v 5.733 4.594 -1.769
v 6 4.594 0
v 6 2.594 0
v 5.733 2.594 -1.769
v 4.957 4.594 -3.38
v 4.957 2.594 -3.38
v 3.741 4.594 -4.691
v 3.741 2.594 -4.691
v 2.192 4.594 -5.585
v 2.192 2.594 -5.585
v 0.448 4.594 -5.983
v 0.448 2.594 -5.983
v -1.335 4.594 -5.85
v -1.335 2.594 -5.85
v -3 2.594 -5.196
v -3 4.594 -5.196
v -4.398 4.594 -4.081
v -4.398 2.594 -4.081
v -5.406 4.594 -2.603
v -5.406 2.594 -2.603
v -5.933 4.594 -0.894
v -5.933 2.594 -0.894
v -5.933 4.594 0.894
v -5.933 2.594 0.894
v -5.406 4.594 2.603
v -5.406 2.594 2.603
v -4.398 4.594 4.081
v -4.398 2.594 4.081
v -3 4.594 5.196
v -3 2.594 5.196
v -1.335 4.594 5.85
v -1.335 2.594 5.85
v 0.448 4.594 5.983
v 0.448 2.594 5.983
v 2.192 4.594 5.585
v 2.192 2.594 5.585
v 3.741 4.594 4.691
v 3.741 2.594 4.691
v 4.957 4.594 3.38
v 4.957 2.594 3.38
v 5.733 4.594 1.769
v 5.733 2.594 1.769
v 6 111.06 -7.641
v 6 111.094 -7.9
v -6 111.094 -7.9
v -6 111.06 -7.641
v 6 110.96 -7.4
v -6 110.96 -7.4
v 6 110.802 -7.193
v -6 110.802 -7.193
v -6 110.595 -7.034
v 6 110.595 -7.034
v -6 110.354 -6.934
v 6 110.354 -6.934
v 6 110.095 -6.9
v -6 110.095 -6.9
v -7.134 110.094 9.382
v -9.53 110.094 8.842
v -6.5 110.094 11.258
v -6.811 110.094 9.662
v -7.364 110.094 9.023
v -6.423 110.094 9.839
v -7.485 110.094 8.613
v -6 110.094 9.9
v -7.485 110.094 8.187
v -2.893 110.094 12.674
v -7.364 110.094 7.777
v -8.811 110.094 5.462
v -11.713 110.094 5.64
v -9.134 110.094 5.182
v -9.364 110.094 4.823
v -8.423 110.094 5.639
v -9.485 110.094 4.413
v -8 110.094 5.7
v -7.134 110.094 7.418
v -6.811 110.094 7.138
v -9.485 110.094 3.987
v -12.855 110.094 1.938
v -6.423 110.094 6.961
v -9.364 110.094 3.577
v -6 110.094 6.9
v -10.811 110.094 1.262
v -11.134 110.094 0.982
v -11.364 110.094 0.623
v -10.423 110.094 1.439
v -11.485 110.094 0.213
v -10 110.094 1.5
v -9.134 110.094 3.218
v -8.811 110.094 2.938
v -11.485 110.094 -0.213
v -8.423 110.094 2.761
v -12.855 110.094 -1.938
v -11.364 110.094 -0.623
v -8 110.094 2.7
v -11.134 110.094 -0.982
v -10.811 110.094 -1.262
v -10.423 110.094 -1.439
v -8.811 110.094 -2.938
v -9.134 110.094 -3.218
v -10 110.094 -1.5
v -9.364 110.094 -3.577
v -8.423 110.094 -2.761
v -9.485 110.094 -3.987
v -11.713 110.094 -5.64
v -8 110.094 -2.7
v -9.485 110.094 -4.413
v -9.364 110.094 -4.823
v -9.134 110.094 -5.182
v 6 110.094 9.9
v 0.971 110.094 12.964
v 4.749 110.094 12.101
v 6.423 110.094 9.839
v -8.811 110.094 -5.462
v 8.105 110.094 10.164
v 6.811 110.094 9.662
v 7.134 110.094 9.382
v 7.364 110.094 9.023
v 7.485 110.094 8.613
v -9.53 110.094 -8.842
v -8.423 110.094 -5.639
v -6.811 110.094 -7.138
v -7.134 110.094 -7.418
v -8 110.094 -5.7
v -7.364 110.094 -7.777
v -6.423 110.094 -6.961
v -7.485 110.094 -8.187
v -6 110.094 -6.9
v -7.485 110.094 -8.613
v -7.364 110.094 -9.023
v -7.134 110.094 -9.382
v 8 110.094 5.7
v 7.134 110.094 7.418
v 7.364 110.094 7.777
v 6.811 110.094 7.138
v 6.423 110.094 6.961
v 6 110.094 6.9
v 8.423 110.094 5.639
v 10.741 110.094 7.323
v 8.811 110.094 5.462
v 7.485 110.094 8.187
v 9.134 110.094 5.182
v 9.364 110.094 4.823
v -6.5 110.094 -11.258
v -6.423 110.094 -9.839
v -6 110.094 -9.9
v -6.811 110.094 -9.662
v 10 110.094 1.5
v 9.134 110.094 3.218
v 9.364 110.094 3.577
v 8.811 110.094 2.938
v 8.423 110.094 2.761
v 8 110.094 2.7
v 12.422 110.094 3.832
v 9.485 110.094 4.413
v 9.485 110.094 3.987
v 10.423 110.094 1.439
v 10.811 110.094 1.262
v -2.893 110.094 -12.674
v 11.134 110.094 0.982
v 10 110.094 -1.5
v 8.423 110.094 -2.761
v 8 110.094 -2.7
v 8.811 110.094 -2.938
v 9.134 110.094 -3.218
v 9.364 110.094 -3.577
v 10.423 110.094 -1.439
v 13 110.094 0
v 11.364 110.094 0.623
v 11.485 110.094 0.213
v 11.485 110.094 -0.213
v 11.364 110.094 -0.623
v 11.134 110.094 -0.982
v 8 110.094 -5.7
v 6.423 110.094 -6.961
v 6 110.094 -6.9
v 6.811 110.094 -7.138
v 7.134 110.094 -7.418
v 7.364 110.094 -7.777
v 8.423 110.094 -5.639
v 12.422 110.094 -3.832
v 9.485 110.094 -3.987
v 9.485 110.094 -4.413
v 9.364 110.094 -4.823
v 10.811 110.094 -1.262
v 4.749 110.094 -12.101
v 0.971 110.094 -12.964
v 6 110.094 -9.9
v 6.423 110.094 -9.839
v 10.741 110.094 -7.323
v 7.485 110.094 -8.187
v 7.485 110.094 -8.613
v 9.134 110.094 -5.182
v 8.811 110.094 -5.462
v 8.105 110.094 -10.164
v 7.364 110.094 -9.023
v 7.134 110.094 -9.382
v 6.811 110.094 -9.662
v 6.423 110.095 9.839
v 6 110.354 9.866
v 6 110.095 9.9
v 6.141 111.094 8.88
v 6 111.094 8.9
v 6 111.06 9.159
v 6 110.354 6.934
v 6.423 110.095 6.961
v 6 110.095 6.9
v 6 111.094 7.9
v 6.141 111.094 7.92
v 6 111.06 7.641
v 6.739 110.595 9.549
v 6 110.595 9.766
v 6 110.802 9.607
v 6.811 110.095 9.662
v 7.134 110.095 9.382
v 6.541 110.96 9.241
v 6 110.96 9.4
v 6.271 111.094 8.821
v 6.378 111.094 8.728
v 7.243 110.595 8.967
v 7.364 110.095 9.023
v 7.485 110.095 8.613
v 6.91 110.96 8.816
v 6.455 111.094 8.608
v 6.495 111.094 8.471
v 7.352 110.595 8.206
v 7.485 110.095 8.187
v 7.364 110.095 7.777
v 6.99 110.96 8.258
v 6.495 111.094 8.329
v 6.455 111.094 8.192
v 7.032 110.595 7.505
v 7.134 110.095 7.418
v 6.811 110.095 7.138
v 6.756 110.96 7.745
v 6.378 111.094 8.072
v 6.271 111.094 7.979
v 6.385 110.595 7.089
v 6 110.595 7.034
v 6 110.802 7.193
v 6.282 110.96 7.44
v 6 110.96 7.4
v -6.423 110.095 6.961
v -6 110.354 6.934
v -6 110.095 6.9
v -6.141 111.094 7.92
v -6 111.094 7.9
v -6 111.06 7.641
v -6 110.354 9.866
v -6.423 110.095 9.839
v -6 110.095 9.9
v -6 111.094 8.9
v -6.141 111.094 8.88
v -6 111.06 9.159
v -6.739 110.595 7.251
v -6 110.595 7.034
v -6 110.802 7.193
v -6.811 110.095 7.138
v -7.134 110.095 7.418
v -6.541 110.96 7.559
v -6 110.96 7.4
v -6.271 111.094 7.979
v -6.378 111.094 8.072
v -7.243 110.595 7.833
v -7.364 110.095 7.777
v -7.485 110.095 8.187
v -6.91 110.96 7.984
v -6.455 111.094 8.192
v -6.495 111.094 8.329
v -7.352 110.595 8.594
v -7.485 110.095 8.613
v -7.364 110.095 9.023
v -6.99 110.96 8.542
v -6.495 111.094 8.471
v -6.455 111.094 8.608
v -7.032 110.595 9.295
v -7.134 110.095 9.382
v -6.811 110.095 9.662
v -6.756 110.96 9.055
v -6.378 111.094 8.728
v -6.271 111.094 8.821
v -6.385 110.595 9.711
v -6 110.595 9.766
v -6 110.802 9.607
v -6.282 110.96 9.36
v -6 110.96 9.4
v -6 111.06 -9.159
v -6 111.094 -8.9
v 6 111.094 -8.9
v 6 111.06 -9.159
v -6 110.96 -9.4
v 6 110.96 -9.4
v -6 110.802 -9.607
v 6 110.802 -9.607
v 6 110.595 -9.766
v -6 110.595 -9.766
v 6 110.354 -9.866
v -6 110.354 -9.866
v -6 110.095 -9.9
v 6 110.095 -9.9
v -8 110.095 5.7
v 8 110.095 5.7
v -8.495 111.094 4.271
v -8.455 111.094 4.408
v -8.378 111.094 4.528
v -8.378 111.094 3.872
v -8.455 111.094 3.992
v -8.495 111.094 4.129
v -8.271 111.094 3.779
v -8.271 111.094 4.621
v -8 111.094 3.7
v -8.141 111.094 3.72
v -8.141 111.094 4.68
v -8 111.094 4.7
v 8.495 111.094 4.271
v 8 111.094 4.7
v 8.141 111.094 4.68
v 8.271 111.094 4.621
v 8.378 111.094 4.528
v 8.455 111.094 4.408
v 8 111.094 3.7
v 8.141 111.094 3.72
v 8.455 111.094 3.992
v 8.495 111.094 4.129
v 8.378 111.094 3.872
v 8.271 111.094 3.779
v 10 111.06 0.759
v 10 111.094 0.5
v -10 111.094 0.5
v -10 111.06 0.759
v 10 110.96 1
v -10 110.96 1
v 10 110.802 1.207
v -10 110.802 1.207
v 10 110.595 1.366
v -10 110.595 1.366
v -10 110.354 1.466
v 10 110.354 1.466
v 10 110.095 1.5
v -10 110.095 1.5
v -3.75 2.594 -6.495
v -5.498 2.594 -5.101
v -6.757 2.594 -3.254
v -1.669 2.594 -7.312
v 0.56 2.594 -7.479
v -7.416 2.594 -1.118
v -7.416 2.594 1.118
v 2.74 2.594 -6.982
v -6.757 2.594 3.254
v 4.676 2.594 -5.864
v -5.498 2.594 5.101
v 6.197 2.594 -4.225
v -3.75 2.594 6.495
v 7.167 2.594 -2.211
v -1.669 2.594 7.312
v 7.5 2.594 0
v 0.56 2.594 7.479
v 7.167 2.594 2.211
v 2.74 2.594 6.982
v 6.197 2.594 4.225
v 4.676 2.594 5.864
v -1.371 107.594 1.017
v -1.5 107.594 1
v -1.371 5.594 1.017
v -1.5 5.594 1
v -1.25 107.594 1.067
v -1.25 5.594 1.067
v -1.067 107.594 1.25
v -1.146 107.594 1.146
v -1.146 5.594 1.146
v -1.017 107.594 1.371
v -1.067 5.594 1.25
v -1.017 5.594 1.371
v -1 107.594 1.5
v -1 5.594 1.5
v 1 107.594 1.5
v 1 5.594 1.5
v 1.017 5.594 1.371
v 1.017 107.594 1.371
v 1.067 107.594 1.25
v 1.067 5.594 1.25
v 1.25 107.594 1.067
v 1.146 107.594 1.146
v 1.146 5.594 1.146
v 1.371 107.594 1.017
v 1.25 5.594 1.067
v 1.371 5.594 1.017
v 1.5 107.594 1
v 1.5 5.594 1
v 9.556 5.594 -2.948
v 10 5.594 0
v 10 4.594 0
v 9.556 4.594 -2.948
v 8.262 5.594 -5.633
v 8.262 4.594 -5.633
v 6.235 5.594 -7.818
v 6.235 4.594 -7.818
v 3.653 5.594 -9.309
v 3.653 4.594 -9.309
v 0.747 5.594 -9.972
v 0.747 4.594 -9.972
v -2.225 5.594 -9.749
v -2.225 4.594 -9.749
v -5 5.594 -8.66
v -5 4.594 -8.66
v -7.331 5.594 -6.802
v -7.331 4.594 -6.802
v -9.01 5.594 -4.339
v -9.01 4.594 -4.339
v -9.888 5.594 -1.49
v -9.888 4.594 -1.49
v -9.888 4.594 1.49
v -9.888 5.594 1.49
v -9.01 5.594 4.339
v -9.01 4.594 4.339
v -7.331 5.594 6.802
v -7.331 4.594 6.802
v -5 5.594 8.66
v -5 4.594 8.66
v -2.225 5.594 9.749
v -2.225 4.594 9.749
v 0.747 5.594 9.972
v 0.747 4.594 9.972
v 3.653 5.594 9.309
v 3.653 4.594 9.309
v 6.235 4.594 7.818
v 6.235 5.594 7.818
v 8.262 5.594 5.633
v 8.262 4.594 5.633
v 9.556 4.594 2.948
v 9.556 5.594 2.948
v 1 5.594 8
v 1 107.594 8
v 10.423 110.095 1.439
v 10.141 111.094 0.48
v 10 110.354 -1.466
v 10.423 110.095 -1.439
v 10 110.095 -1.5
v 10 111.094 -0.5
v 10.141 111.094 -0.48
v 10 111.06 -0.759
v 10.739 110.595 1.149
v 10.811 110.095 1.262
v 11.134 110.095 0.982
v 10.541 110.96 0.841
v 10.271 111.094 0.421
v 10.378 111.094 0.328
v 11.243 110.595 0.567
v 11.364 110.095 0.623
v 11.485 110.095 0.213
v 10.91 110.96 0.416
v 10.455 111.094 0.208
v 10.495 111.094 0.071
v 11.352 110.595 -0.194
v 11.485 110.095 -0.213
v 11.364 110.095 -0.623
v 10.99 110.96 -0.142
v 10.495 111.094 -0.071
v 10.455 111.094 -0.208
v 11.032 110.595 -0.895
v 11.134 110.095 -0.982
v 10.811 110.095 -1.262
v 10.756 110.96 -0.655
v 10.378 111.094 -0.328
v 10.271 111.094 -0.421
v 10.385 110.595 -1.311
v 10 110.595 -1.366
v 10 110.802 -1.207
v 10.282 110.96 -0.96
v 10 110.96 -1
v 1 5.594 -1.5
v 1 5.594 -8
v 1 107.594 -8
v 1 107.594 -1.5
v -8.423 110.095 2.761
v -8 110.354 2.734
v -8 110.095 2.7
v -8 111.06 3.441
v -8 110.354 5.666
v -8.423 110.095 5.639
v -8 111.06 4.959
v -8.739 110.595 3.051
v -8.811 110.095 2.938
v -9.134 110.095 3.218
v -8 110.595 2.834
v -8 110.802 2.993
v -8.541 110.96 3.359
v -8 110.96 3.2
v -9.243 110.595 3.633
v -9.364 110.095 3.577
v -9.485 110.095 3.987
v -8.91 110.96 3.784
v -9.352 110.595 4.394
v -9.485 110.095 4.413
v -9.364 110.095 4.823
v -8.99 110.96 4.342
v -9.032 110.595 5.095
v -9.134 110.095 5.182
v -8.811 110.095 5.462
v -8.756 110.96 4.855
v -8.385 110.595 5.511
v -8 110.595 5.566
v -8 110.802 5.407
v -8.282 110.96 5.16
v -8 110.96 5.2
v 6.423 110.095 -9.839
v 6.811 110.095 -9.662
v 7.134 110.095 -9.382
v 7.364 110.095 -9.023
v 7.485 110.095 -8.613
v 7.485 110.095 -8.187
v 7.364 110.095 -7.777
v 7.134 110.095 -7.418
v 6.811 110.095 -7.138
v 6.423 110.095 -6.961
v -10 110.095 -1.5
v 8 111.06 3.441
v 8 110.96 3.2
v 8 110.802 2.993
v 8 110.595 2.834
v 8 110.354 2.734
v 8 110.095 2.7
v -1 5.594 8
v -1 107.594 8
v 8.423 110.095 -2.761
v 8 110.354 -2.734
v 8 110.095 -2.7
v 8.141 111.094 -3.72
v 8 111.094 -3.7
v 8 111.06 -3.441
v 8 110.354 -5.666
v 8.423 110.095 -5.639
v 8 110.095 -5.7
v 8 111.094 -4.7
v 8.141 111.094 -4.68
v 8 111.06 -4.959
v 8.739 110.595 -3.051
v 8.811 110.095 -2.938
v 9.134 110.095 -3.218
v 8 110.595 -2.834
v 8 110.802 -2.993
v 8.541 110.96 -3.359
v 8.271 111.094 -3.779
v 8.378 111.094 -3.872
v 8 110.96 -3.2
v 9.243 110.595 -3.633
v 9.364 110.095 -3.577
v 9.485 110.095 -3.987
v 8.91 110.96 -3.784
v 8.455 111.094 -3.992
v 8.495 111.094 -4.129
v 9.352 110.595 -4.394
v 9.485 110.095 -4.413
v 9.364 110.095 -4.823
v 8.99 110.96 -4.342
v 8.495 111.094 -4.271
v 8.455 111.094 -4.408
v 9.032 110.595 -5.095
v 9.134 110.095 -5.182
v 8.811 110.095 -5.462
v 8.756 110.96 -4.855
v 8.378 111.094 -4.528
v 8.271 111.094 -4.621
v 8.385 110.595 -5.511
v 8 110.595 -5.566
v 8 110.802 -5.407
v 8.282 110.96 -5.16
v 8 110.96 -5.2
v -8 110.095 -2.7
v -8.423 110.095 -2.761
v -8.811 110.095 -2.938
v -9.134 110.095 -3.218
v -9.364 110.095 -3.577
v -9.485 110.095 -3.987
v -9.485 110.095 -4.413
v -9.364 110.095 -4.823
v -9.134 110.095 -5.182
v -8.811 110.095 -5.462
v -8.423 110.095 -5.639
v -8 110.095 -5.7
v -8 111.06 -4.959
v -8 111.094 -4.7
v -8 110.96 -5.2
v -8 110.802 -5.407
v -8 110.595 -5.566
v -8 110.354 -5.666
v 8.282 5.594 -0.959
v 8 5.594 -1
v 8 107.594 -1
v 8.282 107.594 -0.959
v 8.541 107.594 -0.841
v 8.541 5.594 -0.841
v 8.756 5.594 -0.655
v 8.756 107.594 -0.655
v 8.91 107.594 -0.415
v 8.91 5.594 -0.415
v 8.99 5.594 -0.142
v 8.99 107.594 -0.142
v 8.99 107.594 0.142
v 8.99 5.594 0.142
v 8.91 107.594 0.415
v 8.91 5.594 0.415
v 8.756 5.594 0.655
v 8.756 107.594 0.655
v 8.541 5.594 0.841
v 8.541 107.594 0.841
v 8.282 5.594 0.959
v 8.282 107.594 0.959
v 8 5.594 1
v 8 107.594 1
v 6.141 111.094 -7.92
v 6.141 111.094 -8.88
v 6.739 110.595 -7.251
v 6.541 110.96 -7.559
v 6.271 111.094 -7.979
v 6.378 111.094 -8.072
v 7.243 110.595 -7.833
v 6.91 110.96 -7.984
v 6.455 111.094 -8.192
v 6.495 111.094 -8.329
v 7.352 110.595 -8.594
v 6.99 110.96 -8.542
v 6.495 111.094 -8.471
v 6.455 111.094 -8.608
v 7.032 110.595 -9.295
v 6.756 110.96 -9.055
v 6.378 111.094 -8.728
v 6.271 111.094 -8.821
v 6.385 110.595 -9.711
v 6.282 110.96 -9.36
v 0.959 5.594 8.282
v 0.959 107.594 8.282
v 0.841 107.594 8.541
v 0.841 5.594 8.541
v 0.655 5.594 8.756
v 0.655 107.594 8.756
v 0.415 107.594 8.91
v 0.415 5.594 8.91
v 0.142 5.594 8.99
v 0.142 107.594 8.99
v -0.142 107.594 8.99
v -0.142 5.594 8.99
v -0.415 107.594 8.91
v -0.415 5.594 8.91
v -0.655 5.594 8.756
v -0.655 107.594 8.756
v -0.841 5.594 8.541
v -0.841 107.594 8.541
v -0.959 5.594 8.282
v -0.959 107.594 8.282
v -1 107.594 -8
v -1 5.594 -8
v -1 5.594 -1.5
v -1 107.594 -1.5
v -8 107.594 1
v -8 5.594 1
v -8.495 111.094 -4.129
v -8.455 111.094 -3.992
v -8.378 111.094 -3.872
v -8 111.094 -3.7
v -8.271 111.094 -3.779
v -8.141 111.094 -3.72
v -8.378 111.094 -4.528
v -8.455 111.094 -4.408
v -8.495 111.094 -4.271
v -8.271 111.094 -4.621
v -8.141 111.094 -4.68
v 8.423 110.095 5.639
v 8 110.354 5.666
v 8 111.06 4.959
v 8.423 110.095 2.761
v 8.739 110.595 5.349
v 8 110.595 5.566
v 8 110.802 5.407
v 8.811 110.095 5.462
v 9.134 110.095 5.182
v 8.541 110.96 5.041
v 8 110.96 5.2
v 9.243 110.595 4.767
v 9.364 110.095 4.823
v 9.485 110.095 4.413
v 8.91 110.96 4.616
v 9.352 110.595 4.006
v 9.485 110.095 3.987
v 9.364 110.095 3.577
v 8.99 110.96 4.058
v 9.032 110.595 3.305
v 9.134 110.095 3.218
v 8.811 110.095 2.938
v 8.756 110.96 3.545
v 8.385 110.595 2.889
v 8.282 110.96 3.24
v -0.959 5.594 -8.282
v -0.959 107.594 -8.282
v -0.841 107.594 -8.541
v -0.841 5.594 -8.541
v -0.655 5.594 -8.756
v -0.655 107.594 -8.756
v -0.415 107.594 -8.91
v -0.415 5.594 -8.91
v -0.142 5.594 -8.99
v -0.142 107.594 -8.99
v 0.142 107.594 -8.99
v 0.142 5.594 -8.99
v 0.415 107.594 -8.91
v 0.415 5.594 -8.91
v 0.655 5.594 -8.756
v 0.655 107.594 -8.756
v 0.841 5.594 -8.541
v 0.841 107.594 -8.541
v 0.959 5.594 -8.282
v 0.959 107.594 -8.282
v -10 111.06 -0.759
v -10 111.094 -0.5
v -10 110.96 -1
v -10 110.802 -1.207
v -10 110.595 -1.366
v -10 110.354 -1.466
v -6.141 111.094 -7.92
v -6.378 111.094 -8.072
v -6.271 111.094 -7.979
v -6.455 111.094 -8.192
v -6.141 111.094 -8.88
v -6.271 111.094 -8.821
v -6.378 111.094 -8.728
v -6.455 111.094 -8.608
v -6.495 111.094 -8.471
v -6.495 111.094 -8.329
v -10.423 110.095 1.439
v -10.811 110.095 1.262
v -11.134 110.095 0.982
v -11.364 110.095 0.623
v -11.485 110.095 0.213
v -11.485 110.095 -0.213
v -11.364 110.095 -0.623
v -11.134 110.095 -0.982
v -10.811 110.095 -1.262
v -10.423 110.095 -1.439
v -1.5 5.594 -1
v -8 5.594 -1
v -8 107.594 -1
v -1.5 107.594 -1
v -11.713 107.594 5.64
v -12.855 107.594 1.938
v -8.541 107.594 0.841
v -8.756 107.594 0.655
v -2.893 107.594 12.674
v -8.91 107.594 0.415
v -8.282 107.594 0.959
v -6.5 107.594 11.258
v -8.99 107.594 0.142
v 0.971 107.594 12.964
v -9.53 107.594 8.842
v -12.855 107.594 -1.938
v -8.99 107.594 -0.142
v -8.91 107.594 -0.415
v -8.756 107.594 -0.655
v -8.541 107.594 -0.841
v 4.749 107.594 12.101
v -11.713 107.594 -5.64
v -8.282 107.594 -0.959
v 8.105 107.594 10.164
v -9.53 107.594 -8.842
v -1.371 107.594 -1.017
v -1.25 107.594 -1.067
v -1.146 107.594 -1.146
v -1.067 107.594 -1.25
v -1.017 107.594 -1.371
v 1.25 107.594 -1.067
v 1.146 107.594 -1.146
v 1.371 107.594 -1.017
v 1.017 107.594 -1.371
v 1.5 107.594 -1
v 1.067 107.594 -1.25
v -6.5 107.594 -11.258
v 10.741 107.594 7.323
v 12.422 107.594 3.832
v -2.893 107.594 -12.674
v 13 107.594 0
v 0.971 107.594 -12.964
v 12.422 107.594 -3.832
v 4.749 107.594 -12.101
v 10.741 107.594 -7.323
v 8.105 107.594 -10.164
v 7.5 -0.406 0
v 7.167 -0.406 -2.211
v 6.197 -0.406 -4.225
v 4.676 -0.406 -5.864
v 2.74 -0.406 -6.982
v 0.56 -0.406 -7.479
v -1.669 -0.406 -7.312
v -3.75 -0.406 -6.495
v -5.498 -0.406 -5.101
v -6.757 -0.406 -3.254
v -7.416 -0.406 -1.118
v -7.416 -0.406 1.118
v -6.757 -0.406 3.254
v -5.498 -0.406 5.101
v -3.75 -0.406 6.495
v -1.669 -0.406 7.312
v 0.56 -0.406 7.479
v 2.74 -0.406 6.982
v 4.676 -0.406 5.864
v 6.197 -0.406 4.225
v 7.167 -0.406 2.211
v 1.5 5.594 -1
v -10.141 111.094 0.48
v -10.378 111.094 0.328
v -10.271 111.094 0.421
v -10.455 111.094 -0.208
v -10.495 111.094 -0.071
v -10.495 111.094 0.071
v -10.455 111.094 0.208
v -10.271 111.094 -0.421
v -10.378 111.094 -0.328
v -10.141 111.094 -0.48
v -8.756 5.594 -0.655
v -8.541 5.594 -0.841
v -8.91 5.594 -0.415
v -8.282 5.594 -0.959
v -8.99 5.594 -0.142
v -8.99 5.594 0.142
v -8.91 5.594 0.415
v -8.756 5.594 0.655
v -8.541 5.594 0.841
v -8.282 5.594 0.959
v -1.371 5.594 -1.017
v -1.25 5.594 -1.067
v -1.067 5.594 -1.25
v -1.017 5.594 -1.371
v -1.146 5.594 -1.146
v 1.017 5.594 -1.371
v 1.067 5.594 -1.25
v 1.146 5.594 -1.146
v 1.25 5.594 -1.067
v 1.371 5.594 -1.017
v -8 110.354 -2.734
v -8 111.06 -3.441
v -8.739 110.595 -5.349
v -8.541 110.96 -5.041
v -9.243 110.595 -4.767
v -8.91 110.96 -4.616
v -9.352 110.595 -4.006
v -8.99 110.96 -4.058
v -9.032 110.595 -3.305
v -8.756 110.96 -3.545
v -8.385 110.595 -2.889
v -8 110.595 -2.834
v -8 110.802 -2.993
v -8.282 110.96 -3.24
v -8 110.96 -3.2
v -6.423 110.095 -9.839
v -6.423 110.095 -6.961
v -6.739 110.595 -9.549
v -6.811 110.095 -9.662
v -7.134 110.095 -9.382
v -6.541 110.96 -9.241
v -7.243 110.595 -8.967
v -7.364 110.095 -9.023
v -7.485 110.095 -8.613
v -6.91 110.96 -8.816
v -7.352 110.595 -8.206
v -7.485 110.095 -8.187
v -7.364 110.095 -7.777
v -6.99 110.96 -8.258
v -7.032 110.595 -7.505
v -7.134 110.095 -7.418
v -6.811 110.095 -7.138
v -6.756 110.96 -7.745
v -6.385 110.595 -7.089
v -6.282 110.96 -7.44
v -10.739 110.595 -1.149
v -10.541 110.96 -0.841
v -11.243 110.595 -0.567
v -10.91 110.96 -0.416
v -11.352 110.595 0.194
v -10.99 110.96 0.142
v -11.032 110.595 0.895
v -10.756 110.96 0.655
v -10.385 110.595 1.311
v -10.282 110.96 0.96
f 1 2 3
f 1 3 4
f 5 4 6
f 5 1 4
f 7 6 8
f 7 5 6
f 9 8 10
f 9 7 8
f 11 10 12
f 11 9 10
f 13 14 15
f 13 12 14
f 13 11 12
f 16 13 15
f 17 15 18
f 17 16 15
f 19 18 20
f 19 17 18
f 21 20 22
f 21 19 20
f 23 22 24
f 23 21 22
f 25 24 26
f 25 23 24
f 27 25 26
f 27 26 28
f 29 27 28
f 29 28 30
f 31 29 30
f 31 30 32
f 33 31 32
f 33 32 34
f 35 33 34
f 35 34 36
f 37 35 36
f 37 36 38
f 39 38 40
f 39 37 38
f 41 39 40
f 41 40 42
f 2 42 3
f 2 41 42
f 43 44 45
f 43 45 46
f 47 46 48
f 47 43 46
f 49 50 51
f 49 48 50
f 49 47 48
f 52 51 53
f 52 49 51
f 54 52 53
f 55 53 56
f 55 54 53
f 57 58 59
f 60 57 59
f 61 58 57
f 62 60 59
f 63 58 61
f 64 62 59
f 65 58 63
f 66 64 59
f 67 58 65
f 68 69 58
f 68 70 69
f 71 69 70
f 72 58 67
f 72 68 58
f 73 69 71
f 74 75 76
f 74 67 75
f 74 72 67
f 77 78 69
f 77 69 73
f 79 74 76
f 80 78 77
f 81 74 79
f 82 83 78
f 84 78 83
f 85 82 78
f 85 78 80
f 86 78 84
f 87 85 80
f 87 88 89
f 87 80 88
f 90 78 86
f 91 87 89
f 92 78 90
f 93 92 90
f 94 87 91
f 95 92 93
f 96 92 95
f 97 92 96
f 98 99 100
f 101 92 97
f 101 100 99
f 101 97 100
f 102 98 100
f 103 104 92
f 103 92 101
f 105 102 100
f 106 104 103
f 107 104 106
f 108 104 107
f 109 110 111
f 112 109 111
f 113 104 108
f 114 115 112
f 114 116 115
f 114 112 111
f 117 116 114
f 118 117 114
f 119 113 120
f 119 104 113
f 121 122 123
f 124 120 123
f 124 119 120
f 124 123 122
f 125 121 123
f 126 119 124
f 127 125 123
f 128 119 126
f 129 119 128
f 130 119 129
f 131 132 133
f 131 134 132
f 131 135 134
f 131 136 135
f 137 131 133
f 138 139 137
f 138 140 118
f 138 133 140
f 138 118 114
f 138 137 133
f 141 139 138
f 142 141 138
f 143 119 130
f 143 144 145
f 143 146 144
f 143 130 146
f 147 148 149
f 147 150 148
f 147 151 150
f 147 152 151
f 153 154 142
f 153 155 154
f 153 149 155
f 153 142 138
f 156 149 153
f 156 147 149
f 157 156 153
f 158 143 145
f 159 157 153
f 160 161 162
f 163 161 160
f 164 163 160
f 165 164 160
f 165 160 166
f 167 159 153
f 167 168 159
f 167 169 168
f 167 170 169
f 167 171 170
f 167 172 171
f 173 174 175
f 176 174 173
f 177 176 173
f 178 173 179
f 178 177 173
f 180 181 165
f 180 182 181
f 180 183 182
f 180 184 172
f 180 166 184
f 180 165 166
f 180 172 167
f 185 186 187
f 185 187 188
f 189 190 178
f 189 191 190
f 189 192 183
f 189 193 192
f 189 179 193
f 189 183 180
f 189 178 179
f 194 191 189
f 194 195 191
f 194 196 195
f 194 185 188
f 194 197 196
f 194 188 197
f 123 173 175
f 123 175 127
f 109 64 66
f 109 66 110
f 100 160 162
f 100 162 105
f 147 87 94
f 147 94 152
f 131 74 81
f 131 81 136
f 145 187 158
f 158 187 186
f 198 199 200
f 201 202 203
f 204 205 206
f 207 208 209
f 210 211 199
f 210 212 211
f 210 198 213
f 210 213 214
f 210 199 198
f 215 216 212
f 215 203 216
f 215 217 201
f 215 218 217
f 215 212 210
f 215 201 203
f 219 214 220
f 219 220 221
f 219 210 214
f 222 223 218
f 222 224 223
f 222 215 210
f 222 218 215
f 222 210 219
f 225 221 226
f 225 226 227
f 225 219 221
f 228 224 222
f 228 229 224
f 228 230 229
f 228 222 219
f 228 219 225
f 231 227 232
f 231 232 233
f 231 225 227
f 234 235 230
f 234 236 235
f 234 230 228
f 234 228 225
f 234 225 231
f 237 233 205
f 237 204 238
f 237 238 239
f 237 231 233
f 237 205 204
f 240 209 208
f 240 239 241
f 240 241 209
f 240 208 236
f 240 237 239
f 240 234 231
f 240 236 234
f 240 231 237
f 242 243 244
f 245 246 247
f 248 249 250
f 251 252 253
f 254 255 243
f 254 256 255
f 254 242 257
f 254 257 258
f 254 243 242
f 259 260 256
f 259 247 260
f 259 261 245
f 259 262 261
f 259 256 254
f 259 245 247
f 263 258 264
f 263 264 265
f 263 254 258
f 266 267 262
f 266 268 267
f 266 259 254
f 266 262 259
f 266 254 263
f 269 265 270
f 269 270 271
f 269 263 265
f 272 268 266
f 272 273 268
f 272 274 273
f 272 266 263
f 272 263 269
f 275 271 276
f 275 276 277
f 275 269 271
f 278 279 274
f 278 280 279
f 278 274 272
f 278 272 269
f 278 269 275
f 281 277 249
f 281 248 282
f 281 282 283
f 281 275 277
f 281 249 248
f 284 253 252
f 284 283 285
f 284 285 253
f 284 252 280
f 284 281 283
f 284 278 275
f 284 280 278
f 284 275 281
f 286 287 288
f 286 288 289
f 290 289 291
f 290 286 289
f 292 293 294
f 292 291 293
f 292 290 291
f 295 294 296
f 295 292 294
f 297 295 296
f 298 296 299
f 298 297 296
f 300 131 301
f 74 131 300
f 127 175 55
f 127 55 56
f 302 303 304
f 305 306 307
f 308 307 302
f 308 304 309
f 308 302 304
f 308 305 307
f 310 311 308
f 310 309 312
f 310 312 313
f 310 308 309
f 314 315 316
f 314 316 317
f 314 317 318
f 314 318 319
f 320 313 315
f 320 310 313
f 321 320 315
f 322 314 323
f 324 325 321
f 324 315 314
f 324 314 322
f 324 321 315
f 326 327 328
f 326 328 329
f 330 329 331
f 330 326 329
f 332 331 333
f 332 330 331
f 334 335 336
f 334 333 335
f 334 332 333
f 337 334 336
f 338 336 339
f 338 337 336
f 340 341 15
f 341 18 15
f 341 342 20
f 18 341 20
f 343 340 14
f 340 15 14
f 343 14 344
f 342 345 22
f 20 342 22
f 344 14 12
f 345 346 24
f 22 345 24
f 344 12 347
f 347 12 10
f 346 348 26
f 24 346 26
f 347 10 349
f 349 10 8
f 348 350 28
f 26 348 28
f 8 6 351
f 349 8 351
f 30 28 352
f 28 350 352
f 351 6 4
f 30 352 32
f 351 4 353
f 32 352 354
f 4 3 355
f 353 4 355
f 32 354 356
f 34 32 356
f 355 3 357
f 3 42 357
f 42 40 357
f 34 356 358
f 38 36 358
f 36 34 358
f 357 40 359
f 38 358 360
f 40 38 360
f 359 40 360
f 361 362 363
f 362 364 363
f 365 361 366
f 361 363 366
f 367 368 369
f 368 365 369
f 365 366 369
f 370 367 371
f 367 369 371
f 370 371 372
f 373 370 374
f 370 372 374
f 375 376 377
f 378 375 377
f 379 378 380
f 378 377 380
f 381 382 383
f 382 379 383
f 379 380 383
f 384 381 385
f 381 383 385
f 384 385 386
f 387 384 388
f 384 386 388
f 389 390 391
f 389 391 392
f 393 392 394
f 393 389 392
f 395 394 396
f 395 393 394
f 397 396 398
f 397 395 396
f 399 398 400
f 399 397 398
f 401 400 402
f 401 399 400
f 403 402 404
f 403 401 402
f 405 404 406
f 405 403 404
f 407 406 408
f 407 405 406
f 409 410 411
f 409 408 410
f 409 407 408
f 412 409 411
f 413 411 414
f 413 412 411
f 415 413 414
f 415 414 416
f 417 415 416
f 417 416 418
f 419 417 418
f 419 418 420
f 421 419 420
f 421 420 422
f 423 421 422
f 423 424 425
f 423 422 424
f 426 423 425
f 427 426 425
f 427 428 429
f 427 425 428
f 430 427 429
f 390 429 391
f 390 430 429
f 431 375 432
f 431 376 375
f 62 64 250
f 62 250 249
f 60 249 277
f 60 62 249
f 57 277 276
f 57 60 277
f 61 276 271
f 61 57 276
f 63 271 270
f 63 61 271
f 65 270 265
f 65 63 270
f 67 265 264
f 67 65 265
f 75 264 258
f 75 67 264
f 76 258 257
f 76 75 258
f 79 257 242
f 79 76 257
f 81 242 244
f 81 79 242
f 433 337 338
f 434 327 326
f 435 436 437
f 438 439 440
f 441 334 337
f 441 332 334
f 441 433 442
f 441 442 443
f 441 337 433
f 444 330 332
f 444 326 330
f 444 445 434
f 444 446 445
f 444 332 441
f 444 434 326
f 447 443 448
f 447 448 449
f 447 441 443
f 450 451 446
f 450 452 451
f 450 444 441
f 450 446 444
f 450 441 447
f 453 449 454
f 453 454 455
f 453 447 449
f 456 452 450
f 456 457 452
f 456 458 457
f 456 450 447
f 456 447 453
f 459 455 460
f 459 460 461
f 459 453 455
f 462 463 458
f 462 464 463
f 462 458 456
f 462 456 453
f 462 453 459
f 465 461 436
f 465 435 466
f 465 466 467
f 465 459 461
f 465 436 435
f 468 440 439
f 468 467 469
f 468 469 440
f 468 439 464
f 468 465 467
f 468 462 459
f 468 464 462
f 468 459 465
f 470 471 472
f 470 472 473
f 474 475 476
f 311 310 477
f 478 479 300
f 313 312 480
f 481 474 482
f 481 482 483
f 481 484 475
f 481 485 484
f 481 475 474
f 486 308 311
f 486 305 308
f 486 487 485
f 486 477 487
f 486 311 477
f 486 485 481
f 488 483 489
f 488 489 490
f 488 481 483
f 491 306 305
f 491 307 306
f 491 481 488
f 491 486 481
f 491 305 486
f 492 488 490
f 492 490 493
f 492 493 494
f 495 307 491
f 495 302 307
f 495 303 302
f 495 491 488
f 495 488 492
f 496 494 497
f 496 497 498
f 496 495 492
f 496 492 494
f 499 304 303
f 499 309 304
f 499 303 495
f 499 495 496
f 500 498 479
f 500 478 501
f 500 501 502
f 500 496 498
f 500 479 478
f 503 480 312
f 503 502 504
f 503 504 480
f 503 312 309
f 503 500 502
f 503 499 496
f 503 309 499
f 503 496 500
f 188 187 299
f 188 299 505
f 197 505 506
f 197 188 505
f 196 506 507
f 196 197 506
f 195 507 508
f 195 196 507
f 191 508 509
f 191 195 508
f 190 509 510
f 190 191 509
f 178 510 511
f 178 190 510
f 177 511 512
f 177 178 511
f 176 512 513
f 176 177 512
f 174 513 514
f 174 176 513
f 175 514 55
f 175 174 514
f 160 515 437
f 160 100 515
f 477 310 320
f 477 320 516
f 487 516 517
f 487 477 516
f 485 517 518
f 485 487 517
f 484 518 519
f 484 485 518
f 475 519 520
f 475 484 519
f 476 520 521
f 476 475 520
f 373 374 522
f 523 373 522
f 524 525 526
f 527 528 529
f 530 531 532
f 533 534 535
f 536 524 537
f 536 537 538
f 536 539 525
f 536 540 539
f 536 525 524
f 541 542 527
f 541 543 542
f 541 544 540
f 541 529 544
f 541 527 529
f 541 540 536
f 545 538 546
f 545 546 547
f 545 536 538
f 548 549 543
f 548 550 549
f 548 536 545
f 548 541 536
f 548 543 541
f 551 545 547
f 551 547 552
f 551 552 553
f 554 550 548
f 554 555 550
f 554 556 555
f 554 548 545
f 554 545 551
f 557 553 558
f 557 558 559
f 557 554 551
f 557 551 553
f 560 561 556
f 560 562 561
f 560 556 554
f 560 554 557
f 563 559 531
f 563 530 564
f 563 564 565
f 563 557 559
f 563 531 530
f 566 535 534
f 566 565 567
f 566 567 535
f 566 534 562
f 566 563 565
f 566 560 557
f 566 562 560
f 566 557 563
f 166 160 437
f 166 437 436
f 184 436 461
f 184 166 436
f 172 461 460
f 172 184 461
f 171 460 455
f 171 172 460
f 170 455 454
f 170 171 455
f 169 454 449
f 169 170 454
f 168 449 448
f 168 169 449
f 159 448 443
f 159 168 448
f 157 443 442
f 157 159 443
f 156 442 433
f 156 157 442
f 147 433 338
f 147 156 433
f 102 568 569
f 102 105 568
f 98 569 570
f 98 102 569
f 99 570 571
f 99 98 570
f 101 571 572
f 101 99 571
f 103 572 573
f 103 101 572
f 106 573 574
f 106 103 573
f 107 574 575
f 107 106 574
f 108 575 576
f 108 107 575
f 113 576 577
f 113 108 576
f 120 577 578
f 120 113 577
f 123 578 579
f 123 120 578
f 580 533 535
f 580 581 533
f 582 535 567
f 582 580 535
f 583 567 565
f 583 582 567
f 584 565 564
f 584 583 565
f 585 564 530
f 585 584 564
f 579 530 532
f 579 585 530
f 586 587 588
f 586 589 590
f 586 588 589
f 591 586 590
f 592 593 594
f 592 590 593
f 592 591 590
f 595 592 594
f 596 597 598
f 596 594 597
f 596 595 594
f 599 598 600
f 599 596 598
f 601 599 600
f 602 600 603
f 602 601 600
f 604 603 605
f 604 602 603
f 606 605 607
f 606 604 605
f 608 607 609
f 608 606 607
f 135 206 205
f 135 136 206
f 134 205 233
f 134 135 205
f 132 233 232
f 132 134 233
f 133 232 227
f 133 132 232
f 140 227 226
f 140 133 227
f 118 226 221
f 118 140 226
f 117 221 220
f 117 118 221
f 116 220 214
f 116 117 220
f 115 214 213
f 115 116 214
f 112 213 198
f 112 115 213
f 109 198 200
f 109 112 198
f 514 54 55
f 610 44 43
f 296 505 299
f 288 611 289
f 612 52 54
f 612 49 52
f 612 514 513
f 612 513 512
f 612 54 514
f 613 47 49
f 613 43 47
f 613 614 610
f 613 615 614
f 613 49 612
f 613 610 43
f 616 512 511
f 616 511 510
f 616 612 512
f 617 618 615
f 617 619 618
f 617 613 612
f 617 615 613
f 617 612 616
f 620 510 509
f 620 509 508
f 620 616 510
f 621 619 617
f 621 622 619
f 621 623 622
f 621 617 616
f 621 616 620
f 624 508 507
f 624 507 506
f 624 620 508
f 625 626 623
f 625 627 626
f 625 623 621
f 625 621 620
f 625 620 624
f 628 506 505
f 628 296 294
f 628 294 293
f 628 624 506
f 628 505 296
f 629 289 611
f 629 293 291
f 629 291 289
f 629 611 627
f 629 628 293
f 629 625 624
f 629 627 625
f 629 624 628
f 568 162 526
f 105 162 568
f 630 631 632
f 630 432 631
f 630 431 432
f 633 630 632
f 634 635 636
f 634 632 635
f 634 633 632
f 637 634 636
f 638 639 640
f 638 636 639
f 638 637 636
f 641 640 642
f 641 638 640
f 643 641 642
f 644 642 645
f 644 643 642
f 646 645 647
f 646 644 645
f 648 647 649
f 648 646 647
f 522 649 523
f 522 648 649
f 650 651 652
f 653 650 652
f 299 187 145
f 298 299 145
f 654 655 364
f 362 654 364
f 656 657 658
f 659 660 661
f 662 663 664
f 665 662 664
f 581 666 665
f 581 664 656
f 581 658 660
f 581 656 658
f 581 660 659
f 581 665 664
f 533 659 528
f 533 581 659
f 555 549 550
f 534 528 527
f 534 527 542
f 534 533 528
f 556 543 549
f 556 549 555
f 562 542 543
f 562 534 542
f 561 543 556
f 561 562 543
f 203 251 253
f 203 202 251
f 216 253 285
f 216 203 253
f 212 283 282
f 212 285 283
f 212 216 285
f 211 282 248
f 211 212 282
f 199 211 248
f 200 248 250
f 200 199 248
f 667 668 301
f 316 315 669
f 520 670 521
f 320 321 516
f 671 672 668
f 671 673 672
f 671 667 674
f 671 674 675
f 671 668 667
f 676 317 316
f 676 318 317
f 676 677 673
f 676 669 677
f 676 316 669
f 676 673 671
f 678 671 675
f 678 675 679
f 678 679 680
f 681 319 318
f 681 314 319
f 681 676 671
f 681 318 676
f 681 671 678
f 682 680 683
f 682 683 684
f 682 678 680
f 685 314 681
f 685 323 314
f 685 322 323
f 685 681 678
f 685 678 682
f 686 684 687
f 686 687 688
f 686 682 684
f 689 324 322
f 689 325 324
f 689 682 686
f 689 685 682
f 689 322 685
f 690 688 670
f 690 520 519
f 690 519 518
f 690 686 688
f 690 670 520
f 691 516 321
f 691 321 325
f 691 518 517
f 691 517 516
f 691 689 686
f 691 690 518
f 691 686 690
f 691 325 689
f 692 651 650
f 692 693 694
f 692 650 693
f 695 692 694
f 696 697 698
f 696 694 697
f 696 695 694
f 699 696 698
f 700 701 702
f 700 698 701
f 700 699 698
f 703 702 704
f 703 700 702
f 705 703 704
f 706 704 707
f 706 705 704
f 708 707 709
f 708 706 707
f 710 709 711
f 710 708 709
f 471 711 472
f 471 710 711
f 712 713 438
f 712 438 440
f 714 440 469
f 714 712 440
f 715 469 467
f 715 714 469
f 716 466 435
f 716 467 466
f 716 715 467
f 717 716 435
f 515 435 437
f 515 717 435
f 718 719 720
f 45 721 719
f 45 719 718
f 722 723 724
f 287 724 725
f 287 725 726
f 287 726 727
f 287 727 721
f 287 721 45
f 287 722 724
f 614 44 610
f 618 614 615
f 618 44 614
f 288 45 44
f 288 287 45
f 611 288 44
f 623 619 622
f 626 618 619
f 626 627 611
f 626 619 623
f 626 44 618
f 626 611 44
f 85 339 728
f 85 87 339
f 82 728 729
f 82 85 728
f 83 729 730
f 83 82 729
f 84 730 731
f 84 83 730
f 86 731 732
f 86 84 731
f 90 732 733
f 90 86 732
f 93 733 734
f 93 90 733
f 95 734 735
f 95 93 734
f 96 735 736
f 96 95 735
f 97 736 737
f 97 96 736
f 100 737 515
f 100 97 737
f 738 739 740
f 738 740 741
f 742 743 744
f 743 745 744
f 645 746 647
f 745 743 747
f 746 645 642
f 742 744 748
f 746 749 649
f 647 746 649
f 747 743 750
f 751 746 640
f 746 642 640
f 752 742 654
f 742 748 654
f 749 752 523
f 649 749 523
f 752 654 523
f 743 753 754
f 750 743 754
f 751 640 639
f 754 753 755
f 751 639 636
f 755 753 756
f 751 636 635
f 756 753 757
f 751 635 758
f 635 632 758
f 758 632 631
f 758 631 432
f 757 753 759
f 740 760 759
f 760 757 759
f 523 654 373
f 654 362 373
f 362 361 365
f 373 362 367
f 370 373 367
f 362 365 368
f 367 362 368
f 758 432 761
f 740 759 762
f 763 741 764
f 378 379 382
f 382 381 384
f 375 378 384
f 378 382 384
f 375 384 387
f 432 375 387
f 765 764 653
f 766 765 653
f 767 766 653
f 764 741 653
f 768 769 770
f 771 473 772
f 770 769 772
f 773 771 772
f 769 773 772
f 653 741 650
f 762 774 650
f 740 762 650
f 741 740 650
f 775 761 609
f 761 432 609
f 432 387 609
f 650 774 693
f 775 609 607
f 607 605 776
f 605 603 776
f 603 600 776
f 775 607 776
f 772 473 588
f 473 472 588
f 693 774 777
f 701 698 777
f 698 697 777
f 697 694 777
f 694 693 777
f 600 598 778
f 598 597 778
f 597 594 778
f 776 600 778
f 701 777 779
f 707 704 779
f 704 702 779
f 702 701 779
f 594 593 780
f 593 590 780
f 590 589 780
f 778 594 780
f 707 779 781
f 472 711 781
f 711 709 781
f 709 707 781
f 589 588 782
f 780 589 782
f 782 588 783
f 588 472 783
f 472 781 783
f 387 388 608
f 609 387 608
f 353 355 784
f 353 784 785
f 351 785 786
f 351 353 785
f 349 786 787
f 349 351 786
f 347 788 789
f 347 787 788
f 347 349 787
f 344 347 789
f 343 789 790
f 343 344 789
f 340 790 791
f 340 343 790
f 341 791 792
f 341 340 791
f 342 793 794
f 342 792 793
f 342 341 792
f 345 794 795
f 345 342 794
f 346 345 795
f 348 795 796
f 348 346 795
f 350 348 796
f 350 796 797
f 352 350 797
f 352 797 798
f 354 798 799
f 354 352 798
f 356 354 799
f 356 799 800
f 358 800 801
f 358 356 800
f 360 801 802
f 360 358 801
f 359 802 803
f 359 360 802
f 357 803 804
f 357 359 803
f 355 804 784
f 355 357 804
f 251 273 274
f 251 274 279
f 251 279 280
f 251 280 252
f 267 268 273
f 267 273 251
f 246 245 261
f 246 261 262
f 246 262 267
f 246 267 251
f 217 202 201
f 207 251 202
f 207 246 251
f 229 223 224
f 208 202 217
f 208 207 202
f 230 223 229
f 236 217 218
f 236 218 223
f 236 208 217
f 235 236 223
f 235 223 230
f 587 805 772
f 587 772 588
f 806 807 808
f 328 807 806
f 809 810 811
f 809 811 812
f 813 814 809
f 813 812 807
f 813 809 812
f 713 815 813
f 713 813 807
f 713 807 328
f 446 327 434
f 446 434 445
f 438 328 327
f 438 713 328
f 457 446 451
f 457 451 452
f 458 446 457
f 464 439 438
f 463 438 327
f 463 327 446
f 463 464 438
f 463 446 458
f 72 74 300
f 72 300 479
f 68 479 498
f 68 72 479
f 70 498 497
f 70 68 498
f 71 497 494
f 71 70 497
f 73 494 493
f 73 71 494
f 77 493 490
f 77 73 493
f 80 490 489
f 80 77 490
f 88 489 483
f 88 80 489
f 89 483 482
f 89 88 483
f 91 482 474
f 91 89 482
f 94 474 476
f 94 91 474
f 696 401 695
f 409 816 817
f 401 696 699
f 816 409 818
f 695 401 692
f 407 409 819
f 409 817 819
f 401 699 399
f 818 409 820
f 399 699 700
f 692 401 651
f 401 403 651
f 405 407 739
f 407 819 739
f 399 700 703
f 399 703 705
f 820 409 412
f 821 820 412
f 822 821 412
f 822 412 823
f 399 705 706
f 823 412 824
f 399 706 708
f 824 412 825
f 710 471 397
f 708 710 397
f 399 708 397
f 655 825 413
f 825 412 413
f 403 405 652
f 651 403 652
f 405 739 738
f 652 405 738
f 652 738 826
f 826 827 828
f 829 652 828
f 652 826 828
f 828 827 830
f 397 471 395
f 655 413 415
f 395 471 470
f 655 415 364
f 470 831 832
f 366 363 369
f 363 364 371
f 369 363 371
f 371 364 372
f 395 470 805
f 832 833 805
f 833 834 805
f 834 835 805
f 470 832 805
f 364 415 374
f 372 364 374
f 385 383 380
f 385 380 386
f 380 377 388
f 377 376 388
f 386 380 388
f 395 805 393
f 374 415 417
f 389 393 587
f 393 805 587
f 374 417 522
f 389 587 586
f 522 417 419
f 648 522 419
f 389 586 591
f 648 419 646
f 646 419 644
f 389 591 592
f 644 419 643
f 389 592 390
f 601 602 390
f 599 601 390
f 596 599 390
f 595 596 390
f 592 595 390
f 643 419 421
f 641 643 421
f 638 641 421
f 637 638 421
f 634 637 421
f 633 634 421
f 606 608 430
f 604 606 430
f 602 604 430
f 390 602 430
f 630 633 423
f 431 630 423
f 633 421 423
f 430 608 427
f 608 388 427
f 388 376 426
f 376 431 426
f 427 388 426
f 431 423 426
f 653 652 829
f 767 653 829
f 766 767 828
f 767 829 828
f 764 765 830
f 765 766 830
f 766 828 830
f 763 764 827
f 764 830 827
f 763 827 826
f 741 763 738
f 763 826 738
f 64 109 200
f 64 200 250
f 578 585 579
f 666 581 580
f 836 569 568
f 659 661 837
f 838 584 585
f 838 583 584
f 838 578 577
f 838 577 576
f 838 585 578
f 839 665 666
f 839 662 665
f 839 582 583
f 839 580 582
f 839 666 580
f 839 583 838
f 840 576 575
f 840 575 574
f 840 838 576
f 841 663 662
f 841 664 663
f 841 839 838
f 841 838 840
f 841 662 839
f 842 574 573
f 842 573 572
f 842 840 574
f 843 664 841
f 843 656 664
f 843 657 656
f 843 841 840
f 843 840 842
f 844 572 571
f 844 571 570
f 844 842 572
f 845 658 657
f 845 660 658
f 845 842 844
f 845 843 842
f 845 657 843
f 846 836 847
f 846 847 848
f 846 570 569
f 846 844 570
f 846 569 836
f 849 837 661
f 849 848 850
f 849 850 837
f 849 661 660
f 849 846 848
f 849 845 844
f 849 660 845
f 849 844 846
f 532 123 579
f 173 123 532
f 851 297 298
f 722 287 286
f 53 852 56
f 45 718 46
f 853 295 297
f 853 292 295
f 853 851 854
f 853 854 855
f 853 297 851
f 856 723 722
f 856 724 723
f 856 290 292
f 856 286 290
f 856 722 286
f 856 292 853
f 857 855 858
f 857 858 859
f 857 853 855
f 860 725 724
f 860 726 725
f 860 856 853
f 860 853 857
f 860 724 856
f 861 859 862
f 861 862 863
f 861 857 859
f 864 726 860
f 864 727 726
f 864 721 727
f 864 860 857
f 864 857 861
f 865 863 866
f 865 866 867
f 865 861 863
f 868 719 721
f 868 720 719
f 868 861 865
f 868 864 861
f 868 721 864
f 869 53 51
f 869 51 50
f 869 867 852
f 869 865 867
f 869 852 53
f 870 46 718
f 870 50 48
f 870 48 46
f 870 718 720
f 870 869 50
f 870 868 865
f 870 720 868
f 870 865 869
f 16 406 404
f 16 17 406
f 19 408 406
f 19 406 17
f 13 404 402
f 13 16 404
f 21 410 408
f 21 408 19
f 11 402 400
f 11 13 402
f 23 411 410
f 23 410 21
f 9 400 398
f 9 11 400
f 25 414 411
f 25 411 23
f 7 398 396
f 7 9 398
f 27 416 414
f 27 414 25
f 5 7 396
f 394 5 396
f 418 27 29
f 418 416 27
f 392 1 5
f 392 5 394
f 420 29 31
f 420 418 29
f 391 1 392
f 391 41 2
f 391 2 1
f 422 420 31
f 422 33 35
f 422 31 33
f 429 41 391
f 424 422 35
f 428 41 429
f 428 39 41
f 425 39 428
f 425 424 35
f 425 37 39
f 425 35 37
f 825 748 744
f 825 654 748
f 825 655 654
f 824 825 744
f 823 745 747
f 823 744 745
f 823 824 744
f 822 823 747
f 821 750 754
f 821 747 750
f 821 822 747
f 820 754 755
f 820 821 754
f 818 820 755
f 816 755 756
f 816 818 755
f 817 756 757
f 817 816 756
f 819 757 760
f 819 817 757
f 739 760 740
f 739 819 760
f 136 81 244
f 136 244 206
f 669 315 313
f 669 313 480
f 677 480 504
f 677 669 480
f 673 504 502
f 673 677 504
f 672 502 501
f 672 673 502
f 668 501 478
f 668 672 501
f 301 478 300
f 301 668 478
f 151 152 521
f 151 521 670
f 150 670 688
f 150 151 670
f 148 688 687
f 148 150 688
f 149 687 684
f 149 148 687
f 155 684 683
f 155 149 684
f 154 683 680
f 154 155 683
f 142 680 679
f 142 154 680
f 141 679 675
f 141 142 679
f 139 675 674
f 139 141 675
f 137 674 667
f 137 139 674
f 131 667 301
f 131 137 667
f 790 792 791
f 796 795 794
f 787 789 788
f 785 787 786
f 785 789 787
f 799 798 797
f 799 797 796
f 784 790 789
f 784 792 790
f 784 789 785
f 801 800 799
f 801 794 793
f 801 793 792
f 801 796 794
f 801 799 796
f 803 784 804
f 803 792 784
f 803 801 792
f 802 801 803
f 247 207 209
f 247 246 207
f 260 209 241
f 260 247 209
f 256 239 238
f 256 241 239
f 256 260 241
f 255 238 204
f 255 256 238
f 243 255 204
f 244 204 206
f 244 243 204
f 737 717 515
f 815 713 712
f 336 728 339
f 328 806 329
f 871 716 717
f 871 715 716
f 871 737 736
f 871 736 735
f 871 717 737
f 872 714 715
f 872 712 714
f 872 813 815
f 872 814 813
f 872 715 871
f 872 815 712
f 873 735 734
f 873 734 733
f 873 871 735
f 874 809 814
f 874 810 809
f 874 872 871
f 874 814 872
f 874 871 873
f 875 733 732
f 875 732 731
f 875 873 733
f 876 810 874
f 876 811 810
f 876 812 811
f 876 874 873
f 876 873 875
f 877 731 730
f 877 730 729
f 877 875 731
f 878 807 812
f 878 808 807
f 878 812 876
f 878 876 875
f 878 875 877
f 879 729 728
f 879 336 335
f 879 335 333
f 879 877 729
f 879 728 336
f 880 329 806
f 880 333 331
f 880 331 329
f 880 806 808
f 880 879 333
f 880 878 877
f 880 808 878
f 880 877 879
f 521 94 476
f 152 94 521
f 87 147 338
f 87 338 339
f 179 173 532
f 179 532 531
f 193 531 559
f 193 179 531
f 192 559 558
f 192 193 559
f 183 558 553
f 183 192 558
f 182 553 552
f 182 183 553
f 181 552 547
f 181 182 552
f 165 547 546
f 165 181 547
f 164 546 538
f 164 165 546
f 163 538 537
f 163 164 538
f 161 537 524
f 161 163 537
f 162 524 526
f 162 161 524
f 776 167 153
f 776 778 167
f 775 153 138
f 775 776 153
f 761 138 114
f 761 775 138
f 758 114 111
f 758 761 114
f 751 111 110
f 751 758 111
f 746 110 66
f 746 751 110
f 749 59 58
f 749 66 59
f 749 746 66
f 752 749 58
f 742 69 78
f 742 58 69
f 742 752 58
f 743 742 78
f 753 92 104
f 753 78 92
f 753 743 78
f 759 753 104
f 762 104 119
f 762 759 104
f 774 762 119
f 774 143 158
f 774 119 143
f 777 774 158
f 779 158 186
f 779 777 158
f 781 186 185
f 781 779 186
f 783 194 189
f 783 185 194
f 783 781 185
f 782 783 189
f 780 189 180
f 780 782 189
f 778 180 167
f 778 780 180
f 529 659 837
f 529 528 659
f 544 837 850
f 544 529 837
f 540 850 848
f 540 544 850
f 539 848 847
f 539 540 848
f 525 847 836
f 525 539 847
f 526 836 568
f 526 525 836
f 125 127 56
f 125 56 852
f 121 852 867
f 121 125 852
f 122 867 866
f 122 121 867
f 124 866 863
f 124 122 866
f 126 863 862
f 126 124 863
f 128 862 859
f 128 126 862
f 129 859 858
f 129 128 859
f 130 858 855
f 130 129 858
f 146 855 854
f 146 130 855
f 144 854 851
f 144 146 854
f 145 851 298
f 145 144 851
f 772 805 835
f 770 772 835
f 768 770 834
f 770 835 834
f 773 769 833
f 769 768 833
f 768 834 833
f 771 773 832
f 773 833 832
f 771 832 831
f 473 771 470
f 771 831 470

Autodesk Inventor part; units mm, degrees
ref_plane "YZ Plane" through (0, 0, 0) normal (1, 0, 0) x (0, 1, 0)
ref_plane "XZ Plane" through (0, 0, 0) normal (0, 1, 0) x (-1, 0, 0)
ref_plane "XY Plane" through (0, 0, 0) normal (0, 0, 1) x (1, 0, 0)
sketch "Sketch1" plane through (0, 0, 0) normal (0, 0, 1) x (1, 0, 0)
  line L0 (0, 5.5944) -> (0, -0.4056)
  line L1 (0, -0.4056) -> (7.5, -0.4056)
  line L2 (7.5, -0.4056) -> (7.5, 2.5944)
  line L3 (7.5, 2.5944) -> (6, 2.5944)
  line L4 (6, 2.5944) -> (6, 4.5944)
  line L5 (6, 4.5944) -> (10, 4.5944)
  line L6 (10, 4.5944) -> (10, 5.5944)
  line L7 (10, 5.5944) -> (0, 5.5944)
  point P0 (0, 0)
  dimension "d0" = 10
  dimension "d1" = 6
  dimension "d2" = 1
  dimension "d3" = 2
  dimension "d4" = 3
  dimension "d5" = 7.5
revolve "Revolution1" add sketch "Sketch1" angle 360 about axis through (0, 5.5944, 0) along (0, -1, 0)
sketch "Sketch2" plane through (0, 5.5944, 0) normal (0, 1, 0) x (1, 0, 0)
  arc A0 (1, 8) -> (-1, 8) centre (0, 8) ccw
  arc A1 (8, -1) -> (8, 1) centre (8, 0) ccw
  arc A2 (-1, -8) -> (1, -8) centre (0, -8) ccw
  arc A3 (-8, 1) -> (-8, -1) centre (-8, 0) ccw
  line L0 (-1, 8) -> (-1, 1.5)
  line L1 (-1, -1.5) -> (-1, -8)
  line L2 (1, 8) -> (1, 1.5)
  line L3 (1, -1.5) -> (1, -8)
  line L4 (-8, -1) -> (-1.5, -1)
  line L5 (1.5, -1) -> (8, -1)
  line L6 (-8, 1) -> (-1.5, 1)
  line L7 (1.5, 1) -> (8, 1)
  arc A4 (-1.5, 1) -> (-1, 1.5) centre (-1.5, 1.5) ccw
  arc A5 (1, 1.5) -> (1.5, 1) centre (1.5, 1.5) ccw
  arc A6 (-1, -1.5) -> (-1.5, -1) centre (-1.5, -1.5) ccw
  arc A7 (1.5, -1) -> (1, -1.5) centre (1.5, -1.5) ccw
  point P0 (0, 0)
  dimension "d11" = 8
  dimension "d16" = 8
  dimension "d17" = 8
  dimension "d18" = 8
  dimension "d19" = 0.5
extrude "Extrusion1" add sketch "Sketch2" along normal blind 102
sketch "Sketch3" plane through (0, 107.5944, 0) normal (0, 1, 0) x (1, 0, 0)
  circle A0 centre (0, 0) radius 13
  dimension "d22" = 26
extrude "Extrusion2" add sketch "Sketch3" along normal blind 2.5
sketch "Sketch4" plane through (0, 110.0944, 0) normal (0, 1, 0) x (1, 0, 0)
  line L0 (10, -1.5) -> (0, -1.5)
  line L1 (10, 1.5) -> (0, 1.5)
  arc A0 (10, -1.5) -> (10, 1.5) centre (10, 0) ccw
  line L2 (8, 2.7) -> (0, 2.7)
  line L3 (8, 5.7) -> (0, 5.7)
  arc A1 (8, 2.7) -> (8, 5.7) centre (8, 4.2) ccw
  line L4 (0, 6.9) -> (6, 6.9)
  line L5 (0, 9.9) -> (6, 9.9)
  arc A2 (6, 6.9) -> (6, 9.9) centre (6, 8.4) ccw
  line L6 (8, -2.7) -> (0, -2.7)
  line L7 (8, -5.7) -> (0, -5.7)
  arc A3 (8, -5.7) -> (8, -2.7) centre (8, -4.2) ccw
  line L8 (6, -6.9) -> (0, -6.9)
  line L9 (6, -9.9) -> (0, -9.9)
  arc A4 (6, -9.9) -> (6, -6.9) centre (6, -8.4) ccw
  line L10 (-10, -1.5) -> (0, -1.5)
  line L11 (-10, 1.5) -> (0, 1.5)
  arc A5 (-10, 1.5) -> (-10, -1.5) centre (-10, 0) ccw
  line L12 (-8, 2.7) -> (0, 2.7)
  line L13 (-8, 5.7) -> (0, 5.7)
  arc A6 (-8, 5.7) -> (-8, 2.7) centre (-8, 4.2) ccw
  line L14 (0, 6.9) -> (-6, 6.9)
  line L15 (0, 9.9) -> (-6, 9.9)
  arc A7 (-6, 9.9) -> (-6, 6.9) centre (-6, 8.4) ccw
  line L16 (-8, -2.7) -> (0, -2.7)
  line L17 (-8, -5.7) -> (0, -5.7)
  arc A8 (-8, -2.7) -> (-8, -5.7) centre (-8, -4.2) ccw
  line L18 (-6, -6.9) -> (0, -6.9)
  line L19 (-6, -9.9) -> (0, -9.9)
  arc A9 (-6, -6.9) -> (-6, -9.9) centre (-6, -8.4) ccw
  point P0 (0, 0)
  dimension "d25" = 1.5
  dimension "d26" = 1.5
  dimension "d27" = 10
  dimension "d28" = 10
  dimension "d29" = 1.2
  dimension "d30" = 3
  dimension "d31" = 8
  dimension "d32" = 8
  dimension "d33" = 1.2
  dimension "d34" = 6
  dimension "d35" = 6
  dimension "d36" = 3
  dimension "d37" = 1.2
  dimension "d38" = 8
  dimension "d39" = 8
  dimension "d40" = 3
  dimension "d41" = 1.2
  dimension "d42" = 3
  dimension "d43" = 6
  dimension "d44" = 6
extrude "Extrusion3" add sketch "Sketch4" along normal blind 1
fillet "Fillet1" radius 1 20 edges at (7.5, 111.0944, -8.4) (0, 111.0944, -9.9) (-7.5, 111.0944, -8.4) (0, 111.0944, -6.9) (9.5, 111.0944, -4.2) (0, 111.0944, -5.7) (-9.5, 111.0944, -4.2) (0, 111.0944, -2.7) (11.5, 111.0944, 0) (0, 111.0944, -1.5) (-11.5, 111.0944, 0) (0, 111.0944, 1.5) (9.5, 111.0944, 4.2) (0, 111.0944, 2.7) (-9.5, 111.0944, 4.2) (0, 111.0944, 5.7) (7.5, 111.0944, 8.4) (0, 111.0944, 6.9) (-7.5, 111.0944, 8.4) (0, 111.0944, 9.9)
properties part number "Plunger"
